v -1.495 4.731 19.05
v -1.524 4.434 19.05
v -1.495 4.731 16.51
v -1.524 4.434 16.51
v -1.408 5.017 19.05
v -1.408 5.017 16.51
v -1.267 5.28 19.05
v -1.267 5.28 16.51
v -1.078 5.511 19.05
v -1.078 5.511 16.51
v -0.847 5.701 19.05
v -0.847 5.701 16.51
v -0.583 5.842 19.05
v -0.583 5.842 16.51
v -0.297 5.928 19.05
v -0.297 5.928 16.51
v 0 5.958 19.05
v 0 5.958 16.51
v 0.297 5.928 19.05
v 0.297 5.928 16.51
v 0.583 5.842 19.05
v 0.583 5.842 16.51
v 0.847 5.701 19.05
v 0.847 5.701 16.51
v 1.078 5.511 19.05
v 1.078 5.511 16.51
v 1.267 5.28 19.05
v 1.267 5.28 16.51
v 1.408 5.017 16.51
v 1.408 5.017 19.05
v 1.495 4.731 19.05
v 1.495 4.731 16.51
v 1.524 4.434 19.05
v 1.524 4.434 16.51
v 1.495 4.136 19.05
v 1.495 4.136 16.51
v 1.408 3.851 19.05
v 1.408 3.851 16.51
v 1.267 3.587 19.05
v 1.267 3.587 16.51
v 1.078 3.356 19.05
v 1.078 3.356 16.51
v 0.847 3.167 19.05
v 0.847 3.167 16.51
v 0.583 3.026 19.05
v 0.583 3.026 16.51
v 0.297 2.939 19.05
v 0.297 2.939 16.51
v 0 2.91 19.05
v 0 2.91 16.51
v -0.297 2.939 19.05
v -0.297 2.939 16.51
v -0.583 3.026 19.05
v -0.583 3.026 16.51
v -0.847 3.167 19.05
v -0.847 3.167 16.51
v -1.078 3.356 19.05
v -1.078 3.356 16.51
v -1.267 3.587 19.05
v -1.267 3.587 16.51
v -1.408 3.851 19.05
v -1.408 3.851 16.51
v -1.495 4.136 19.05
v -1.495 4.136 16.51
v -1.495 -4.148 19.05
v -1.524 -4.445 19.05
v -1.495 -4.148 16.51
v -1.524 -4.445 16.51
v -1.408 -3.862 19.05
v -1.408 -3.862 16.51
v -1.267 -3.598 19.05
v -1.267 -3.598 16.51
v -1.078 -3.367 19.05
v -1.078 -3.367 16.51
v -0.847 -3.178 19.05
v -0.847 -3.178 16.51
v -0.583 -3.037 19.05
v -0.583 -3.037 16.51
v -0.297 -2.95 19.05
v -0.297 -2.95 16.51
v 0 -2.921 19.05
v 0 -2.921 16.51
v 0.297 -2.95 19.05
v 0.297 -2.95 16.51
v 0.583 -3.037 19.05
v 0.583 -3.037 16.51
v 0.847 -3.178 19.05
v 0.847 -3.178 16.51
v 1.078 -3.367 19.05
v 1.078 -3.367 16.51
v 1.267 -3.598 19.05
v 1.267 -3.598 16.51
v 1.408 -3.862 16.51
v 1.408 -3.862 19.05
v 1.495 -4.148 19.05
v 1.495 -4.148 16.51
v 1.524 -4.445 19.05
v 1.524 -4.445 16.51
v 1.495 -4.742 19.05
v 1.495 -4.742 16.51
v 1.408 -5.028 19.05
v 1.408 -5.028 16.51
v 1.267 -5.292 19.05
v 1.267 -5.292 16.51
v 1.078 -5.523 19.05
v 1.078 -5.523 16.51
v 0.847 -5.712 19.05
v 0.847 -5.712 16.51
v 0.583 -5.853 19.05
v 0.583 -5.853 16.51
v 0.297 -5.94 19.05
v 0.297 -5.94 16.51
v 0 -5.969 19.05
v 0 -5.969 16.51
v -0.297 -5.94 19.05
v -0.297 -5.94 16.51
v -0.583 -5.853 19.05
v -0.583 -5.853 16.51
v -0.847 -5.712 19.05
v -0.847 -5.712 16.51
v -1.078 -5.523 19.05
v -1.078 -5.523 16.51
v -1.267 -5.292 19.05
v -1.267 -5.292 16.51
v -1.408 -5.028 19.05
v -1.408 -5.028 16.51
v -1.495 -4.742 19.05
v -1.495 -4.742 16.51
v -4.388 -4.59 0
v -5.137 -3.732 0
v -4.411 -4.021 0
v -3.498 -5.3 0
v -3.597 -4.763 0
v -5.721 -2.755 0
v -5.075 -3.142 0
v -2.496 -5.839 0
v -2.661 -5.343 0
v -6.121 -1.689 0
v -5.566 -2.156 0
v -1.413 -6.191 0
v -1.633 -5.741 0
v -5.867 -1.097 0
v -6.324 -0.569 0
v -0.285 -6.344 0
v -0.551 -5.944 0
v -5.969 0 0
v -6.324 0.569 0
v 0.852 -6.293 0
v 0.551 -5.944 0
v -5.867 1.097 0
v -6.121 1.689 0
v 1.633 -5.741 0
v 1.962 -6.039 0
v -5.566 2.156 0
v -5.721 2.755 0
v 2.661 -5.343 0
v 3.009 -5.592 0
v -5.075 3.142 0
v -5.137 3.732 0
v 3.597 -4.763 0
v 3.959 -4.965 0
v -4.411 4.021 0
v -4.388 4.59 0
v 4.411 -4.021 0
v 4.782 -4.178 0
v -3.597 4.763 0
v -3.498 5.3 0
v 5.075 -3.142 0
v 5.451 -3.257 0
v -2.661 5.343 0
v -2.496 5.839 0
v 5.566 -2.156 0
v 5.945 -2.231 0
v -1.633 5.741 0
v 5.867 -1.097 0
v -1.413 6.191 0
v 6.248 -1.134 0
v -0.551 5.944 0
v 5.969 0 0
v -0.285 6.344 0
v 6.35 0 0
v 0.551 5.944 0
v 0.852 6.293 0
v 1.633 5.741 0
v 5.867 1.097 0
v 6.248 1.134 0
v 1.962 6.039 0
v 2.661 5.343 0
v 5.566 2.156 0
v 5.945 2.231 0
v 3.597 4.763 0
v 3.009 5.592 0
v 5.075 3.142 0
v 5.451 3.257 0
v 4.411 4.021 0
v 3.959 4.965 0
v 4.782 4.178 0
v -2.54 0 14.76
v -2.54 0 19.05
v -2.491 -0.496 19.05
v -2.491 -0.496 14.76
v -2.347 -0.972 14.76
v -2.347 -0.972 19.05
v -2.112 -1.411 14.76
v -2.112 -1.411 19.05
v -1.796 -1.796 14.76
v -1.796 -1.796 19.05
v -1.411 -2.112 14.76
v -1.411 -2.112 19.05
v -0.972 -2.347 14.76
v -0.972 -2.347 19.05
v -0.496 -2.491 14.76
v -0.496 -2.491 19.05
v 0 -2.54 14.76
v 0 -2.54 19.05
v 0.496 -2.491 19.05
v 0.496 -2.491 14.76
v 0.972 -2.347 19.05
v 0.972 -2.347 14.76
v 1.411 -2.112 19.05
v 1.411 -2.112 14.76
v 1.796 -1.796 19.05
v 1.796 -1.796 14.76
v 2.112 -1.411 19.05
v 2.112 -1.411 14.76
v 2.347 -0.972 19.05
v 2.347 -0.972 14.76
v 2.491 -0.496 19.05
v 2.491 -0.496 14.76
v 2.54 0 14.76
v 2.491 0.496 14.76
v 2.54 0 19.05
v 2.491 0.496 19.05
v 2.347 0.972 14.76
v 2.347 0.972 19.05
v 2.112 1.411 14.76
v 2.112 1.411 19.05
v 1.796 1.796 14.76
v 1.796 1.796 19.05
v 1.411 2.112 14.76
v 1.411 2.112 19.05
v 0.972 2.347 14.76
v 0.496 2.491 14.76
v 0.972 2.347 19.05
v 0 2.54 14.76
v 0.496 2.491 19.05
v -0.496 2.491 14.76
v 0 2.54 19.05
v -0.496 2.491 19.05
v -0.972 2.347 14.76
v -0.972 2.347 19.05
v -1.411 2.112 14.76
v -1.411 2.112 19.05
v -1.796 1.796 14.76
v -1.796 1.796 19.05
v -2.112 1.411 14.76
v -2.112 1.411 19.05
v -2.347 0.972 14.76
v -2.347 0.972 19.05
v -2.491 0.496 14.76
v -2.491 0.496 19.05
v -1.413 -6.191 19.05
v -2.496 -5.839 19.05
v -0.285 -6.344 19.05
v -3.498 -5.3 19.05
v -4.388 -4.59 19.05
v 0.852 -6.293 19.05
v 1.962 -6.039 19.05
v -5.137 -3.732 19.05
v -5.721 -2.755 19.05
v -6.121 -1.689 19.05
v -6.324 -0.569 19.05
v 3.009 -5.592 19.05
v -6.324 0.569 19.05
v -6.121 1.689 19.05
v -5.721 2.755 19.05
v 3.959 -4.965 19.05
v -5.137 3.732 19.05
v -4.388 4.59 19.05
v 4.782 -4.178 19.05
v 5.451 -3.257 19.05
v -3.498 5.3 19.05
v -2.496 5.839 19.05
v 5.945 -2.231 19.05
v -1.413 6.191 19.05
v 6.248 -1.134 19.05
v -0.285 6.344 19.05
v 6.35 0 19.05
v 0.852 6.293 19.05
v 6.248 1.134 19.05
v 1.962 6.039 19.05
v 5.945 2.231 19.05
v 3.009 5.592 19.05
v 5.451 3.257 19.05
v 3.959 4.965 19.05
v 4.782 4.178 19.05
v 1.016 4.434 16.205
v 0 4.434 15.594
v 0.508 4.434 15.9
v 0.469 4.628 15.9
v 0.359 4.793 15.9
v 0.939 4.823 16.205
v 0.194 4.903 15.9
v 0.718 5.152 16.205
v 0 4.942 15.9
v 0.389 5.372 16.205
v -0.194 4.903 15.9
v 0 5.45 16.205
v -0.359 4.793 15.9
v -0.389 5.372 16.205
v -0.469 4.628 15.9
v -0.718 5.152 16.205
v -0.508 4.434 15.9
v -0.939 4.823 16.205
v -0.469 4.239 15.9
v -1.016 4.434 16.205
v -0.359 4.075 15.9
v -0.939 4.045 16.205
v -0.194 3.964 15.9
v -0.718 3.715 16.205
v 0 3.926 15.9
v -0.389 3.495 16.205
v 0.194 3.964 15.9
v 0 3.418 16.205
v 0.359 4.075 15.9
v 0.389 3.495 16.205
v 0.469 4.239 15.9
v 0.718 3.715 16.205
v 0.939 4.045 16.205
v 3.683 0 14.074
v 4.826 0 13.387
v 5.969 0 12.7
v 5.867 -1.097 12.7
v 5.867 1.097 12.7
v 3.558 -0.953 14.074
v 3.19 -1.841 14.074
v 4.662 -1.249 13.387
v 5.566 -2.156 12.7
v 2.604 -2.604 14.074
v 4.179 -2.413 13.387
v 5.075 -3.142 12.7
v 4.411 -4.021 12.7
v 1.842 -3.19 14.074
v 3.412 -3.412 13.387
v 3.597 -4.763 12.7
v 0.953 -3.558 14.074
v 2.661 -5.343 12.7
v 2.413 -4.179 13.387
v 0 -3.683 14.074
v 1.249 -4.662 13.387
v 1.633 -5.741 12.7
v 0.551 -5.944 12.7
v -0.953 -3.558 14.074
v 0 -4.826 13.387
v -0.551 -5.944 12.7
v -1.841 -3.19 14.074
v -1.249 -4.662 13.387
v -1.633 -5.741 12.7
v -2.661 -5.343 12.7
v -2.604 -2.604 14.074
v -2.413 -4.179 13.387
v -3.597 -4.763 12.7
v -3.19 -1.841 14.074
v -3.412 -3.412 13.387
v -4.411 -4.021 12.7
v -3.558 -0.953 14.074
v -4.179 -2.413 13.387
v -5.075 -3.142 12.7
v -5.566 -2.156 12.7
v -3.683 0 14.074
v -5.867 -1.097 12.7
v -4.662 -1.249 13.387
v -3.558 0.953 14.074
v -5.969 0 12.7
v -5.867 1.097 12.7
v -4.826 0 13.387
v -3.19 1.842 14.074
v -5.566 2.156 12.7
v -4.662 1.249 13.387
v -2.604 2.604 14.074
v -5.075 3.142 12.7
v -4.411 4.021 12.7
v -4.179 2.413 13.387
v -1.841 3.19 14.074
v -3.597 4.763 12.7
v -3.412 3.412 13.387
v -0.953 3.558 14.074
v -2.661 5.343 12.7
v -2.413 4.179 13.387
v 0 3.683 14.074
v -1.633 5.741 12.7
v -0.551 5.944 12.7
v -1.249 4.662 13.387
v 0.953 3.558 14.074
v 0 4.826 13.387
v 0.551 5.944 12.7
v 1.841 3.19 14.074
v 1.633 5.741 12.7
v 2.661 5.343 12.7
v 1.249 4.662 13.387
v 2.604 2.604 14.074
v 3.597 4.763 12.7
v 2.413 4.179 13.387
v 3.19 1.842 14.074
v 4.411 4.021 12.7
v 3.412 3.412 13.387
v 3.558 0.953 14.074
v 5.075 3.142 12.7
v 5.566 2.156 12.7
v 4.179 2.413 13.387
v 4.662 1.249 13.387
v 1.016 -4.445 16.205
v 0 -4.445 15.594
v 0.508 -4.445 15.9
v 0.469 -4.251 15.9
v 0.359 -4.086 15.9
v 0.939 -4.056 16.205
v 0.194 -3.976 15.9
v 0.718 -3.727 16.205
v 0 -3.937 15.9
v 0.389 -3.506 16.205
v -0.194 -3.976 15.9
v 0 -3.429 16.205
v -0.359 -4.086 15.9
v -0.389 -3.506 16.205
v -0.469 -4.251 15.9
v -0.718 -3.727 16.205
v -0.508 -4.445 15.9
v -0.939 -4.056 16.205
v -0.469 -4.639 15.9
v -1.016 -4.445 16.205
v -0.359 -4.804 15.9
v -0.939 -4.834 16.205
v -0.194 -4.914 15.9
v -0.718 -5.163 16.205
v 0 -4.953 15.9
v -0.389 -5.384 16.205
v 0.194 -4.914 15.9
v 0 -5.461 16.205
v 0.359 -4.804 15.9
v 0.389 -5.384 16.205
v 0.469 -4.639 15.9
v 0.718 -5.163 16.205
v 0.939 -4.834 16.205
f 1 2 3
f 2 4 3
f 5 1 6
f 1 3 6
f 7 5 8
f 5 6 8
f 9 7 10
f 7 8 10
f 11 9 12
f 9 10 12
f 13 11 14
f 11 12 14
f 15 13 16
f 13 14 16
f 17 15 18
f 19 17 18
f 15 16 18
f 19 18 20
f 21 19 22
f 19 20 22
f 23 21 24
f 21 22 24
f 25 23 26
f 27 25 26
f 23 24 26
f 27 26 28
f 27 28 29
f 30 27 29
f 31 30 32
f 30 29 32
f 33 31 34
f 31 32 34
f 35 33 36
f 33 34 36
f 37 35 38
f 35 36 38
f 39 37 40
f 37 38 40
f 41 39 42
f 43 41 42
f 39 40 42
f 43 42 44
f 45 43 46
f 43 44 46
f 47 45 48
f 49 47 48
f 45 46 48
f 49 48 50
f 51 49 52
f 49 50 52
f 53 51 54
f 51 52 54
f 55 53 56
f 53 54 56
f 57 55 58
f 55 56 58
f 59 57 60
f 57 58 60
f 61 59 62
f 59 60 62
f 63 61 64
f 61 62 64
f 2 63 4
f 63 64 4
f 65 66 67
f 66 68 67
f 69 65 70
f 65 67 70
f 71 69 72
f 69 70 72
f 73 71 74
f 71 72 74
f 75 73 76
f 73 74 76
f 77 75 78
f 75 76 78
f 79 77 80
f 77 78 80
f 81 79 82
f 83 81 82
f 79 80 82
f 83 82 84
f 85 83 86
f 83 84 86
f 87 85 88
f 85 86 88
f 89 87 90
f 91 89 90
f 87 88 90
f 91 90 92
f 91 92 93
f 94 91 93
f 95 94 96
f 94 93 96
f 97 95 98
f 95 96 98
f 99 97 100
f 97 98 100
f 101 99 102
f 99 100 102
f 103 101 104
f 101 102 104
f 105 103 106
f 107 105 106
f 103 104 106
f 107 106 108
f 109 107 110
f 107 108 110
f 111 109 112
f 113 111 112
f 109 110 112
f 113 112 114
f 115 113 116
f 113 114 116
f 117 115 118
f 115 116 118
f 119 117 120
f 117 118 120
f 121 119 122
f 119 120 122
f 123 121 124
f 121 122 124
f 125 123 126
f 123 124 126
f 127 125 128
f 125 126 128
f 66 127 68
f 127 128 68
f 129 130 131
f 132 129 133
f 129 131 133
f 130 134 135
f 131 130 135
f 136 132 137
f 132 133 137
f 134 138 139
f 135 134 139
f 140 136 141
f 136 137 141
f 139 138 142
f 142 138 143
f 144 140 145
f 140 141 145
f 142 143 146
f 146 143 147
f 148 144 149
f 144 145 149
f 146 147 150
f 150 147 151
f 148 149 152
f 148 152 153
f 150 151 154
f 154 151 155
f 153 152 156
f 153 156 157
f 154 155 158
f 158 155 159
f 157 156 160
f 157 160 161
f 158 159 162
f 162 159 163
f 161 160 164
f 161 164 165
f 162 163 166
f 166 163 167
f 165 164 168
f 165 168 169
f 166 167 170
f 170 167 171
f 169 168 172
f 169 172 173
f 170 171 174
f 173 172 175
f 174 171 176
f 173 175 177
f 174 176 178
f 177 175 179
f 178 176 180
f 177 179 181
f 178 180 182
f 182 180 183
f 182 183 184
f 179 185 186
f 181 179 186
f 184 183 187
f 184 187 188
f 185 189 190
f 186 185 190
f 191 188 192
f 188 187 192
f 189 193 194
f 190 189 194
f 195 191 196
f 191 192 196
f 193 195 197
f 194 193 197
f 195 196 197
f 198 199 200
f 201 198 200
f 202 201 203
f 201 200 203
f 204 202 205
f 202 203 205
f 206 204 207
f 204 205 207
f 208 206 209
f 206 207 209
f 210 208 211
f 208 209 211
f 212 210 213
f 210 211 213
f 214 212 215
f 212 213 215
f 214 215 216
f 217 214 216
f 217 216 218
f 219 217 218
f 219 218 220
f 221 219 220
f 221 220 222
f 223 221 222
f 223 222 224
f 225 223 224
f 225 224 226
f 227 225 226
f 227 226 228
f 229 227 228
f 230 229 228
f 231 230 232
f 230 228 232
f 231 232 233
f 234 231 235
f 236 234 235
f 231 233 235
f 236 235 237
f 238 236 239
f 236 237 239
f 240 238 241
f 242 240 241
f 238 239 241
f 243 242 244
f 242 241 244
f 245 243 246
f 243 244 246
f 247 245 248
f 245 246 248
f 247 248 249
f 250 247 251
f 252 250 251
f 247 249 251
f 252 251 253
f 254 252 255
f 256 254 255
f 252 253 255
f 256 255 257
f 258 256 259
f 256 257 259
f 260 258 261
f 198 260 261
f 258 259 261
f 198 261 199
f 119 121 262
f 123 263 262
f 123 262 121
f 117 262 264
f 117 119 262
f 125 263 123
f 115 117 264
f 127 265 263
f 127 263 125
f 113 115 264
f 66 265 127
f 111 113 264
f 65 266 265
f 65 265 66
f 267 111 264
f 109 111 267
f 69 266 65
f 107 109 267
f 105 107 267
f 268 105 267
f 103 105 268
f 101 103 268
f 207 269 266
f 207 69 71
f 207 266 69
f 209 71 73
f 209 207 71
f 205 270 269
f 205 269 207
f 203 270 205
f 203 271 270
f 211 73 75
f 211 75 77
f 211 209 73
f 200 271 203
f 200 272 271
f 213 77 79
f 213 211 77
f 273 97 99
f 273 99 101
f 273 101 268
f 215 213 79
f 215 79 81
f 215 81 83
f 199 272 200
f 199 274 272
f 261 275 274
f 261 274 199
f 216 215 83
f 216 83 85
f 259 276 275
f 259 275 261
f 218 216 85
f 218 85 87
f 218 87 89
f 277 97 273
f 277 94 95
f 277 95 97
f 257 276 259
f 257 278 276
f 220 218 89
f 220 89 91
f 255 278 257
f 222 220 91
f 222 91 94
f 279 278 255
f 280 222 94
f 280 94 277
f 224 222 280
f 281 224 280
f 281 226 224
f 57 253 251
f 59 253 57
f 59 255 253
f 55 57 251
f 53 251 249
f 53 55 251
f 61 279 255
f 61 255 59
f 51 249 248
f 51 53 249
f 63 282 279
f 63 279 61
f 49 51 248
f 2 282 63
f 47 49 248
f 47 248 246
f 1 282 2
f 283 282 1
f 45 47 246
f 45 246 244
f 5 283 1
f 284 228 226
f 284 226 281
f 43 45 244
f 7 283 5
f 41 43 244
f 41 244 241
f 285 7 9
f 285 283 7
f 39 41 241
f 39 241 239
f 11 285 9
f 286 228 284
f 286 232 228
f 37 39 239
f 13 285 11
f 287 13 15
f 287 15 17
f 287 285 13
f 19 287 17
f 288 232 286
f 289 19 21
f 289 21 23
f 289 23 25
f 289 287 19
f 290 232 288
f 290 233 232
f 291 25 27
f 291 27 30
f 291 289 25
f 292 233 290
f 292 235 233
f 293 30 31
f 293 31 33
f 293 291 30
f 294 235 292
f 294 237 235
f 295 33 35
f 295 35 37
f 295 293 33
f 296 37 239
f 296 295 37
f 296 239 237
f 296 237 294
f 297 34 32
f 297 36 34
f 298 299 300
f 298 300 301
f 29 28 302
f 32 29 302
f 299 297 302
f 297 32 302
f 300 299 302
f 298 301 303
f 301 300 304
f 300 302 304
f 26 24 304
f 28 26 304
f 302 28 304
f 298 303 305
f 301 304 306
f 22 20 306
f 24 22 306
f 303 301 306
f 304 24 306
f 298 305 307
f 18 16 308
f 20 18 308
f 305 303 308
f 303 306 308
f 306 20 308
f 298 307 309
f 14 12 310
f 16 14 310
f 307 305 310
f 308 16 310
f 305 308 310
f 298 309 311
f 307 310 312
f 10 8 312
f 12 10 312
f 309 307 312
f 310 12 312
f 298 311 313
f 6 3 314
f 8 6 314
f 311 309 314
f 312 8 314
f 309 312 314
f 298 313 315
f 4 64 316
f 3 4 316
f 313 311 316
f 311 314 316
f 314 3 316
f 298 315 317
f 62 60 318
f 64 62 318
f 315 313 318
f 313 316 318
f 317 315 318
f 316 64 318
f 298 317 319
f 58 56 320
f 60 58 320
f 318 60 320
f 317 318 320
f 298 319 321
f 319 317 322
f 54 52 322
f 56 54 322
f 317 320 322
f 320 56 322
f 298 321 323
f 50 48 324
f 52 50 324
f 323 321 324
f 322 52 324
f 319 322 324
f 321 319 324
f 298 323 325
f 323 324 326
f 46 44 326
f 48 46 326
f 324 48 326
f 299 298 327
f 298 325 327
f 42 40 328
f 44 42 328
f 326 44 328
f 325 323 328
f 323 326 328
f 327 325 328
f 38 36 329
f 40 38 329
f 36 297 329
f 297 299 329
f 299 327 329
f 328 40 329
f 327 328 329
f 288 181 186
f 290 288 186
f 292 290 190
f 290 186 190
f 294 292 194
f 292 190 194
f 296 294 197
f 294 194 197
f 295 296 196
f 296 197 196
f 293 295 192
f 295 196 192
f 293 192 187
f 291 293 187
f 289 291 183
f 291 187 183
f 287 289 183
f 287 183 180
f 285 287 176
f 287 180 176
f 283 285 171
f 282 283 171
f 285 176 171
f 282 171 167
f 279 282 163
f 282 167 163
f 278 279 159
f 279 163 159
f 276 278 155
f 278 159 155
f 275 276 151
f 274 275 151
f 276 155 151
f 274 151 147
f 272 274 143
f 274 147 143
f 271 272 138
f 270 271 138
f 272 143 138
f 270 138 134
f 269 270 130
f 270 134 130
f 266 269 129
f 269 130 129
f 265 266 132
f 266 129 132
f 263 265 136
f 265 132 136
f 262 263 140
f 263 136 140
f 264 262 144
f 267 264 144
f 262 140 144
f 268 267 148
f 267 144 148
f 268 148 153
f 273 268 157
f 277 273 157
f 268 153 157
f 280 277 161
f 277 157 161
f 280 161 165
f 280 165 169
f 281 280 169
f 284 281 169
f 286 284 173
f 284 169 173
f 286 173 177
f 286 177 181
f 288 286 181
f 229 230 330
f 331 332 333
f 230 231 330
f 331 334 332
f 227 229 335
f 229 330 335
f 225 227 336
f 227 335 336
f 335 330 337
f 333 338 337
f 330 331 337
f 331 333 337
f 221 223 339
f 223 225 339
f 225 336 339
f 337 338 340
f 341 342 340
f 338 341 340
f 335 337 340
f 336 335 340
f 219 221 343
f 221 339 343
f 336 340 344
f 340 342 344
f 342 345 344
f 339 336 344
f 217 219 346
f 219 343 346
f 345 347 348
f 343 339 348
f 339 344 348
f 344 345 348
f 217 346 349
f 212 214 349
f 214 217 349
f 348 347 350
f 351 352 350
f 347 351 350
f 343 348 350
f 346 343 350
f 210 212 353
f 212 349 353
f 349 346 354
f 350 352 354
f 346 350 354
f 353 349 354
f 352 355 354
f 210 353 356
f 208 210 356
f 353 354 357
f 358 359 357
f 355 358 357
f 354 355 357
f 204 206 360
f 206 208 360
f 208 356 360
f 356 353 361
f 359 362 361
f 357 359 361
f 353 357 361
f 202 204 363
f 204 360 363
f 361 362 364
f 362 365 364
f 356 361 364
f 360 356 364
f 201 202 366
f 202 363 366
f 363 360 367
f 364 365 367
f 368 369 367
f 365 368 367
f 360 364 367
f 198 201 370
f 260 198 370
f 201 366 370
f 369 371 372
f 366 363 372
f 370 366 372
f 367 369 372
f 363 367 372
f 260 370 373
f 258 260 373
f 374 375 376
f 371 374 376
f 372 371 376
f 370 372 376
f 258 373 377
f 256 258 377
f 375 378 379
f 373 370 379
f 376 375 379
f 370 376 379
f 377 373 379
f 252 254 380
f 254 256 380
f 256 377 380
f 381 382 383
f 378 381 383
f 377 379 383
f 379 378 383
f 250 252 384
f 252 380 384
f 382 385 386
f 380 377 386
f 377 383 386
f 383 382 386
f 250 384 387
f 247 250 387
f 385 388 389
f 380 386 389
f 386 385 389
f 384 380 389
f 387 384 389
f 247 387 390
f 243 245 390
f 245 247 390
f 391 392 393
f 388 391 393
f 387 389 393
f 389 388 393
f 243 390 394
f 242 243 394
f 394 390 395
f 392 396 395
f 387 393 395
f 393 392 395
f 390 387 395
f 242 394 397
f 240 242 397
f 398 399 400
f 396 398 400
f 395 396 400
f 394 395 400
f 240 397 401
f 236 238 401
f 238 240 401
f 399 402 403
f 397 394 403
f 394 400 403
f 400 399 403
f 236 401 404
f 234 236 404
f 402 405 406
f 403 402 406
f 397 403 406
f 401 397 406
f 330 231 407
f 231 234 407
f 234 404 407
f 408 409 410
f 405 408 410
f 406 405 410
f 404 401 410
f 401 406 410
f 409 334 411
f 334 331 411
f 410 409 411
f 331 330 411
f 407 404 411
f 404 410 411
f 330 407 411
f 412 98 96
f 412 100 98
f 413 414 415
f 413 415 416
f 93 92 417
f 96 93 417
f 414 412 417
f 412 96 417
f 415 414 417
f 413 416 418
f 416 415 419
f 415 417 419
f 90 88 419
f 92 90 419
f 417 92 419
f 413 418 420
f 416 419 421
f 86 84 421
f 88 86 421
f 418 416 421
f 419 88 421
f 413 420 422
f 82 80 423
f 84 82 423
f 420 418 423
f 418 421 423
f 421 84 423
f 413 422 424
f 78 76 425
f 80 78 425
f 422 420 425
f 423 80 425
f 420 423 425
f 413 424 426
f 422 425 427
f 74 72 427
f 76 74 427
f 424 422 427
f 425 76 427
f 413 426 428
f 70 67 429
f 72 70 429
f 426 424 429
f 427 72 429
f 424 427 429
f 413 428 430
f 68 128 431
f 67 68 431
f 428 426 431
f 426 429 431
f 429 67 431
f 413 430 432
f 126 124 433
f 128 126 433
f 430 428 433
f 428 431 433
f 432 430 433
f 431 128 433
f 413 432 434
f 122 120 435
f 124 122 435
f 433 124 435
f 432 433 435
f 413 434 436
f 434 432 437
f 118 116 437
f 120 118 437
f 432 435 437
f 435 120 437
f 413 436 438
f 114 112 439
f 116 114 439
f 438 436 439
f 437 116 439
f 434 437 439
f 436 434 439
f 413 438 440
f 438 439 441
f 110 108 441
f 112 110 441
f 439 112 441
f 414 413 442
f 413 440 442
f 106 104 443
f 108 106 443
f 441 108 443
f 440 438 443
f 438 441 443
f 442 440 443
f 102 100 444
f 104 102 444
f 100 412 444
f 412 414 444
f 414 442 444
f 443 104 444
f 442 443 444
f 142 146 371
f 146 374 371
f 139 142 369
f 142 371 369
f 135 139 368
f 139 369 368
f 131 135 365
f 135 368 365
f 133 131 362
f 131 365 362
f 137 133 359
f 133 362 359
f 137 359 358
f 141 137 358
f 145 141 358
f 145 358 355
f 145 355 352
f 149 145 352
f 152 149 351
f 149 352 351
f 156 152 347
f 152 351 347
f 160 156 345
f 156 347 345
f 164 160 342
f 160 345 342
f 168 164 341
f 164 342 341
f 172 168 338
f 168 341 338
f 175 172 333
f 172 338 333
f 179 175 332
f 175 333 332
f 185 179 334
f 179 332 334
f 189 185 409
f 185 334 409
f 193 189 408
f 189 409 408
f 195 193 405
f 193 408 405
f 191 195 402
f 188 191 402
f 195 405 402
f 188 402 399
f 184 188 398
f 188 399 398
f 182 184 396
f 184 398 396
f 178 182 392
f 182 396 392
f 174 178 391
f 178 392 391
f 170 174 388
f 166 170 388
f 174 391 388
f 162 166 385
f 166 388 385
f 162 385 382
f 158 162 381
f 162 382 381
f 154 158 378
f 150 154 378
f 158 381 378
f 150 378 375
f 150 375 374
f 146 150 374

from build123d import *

# Parameters (mm, degrees)
F0_R      = 6.35
F1_DEPTH  = 19.05
F3_D      = 5.08
F8_D      = 3.048
F8_DEPTH  = 2.54
F8_TIP    = 0.9157115834
F9_D      = 3.048
F9_DEPTH  = 2.54
F9_TIP    = 0.9157115834
F11_D     = 11.938
F11_DEPTH = 12.7
F11_TIP   = 3.586537035


# Not quite as in the source:
# - the program builds the solid bodies; features that only make, move or delete a surface that nothing else refers to are left out


with BuildPart() as f1:
    # F0 (on Top) → F1 (new body)
    with BuildSketch(Plane.XY):
        Circle(F0_R)
    extrude(amount=F1_DEPTH)

    # F3 (through all)
    with Locations(Plane(origin=(0, 0, 0), x_dir=(1, 0, 0), z_dir=(0, 0, -1))):
        with Locations((0, 0)):
            Hole(F3_D / 2)

    # F8
    with Locations(Plane.XY.offset(19.05)):
        with Locations((0, 4.4337138534)):
            Hole(F8_D / 2, depth=F8_DEPTH)
            with Locations((0, 0, -(F8_DEPTH + F8_TIP / 2))):  # 118° drill point
                Cone(0, F8_D / 2, F8_TIP, mode=Mode.SUBTRACT)

    # F9
    with Locations(Plane.XY.offset(19.05)):
        with Locations((0, -4.445)):
            Hole(F9_D / 2, depth=F9_DEPTH)
            with Locations((0, 0, -(F9_DEPTH + F9_TIP / 2))):  # 118° drill point
                Cone(0, F9_D / 2, F9_TIP, mode=Mode.SUBTRACT)

    # F11
    with Locations(Plane(origin=(0, 0, 0), x_dir=(1, 0, 0), z_dir=(0, 0, -1))):
        with Locations((0, 0)):
            Hole(F11_D / 2, depth=F11_DEPTH)
            with Locations((0, 0, -(F11_DEPTH + F11_TIP / 2))):  # 118° drill point
                Cone(0, F11_D / 2, F11_TIP, mode=Mode.SUBTRACT)


solid = f1.part
